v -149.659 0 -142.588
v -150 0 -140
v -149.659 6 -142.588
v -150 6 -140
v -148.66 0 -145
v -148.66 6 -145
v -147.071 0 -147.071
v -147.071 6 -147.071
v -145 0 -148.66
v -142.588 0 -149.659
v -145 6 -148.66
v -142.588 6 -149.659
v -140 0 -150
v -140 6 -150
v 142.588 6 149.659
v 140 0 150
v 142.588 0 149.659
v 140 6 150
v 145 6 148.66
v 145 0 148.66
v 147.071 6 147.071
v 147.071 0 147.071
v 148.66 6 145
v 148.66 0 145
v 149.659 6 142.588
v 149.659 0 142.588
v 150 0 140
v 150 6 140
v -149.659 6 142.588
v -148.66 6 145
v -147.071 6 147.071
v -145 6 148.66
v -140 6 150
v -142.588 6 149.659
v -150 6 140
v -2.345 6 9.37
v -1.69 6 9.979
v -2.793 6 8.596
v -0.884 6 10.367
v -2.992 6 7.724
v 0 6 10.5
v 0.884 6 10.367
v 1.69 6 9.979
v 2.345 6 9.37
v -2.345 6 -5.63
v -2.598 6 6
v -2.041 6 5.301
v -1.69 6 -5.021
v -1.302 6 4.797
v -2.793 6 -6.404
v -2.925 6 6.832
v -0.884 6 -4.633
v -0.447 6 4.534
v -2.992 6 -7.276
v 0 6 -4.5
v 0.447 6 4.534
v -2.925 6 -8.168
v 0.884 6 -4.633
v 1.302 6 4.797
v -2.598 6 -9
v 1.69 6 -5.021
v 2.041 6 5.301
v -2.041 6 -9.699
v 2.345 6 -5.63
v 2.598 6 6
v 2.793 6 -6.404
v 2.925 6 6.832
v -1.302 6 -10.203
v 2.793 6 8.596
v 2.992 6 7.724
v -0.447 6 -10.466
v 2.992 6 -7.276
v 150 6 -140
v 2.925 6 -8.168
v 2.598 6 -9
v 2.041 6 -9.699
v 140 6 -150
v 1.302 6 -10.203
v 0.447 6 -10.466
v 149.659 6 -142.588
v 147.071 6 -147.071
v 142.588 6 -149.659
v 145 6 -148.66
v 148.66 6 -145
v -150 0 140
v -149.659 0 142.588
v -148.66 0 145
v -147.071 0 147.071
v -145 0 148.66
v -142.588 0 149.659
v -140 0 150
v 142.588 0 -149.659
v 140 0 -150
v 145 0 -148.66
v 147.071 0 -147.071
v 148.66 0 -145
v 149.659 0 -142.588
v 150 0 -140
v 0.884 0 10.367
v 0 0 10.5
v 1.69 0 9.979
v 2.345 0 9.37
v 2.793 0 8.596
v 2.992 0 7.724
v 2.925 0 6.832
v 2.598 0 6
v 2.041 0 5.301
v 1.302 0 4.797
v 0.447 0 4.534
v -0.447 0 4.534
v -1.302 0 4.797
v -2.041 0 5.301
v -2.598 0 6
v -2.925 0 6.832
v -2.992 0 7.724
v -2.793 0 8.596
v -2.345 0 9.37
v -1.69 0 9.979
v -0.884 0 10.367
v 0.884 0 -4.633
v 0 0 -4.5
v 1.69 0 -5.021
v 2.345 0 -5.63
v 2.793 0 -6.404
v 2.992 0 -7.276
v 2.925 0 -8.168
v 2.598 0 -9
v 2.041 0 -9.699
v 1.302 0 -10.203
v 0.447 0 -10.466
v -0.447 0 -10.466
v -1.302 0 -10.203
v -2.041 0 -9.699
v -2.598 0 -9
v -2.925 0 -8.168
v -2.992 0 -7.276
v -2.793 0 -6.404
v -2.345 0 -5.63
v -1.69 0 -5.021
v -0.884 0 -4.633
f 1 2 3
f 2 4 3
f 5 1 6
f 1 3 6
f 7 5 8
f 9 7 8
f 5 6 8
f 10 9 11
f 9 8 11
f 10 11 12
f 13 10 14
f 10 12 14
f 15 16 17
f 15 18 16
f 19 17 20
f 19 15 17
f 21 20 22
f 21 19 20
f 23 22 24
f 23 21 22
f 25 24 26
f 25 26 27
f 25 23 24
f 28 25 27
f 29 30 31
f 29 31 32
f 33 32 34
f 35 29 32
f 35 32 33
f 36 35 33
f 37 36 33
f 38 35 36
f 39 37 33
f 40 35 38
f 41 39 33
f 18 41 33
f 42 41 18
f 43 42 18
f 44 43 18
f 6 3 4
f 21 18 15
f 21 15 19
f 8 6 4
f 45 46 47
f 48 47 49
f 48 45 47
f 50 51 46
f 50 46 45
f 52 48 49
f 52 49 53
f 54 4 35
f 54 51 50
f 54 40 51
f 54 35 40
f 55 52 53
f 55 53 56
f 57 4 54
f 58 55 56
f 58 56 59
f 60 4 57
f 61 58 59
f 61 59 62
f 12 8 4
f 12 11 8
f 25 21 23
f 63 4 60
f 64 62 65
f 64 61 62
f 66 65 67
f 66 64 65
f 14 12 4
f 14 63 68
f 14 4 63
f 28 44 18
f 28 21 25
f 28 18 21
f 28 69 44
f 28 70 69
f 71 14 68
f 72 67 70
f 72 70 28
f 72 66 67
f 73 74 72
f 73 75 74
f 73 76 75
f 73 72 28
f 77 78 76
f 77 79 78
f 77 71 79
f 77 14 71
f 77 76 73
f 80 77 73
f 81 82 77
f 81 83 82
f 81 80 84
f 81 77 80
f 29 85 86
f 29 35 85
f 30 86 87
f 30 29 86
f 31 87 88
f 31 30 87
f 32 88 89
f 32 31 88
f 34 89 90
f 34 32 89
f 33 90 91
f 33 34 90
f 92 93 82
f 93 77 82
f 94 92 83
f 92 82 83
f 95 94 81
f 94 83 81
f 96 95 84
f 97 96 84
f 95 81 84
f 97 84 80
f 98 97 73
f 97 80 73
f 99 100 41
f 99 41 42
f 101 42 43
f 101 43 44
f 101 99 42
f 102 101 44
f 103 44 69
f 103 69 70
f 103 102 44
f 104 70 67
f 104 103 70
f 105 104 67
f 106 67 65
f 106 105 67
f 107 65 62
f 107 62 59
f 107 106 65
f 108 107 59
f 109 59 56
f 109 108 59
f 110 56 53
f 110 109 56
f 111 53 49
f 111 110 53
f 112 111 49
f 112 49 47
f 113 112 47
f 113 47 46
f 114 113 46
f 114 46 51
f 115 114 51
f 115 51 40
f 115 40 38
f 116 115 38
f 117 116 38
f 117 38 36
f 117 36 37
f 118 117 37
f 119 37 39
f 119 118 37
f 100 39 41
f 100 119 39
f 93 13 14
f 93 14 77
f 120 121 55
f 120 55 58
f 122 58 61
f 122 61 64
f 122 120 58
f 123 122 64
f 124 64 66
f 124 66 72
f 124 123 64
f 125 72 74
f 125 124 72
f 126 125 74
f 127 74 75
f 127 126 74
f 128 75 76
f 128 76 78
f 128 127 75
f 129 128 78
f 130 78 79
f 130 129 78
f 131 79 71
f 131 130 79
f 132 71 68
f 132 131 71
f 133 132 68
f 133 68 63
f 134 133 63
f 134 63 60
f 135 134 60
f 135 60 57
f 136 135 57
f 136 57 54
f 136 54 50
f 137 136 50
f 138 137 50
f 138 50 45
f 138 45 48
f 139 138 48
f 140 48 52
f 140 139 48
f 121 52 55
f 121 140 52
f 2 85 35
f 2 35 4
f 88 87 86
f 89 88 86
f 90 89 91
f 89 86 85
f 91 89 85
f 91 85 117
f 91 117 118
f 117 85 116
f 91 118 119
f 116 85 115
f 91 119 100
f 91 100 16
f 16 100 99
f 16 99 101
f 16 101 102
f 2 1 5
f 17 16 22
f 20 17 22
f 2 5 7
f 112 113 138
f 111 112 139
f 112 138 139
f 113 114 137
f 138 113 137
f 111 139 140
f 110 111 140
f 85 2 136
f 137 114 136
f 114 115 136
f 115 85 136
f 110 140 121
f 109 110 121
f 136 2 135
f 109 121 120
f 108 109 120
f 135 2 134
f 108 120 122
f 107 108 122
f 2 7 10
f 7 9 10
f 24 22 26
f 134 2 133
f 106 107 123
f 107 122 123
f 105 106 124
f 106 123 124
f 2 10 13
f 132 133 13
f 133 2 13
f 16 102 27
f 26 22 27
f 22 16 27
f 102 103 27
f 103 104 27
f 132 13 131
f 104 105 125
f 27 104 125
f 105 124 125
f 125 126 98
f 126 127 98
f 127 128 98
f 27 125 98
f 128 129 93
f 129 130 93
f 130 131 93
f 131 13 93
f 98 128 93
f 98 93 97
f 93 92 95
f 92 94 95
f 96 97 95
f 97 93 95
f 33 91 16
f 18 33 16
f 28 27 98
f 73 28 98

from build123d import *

# Parameters (mm, degrees)
WEIGHINGPLATEFORM_W = 300
WEIGHINGPLATEFORM_H = 300
WEIGHINGPLATEFORM_R = 3
BOSS_EXTRUDE1_DEPTH = 6
FILLET1_R           = 10


with BuildPart() as part:
    # WeighingPlateform → Boss-Extrude1 (new body)
    with BuildSketch(Plane(origin=(0, 0, 0), x_dir=(1, 0, 0), z_dir=(0, 1, 0))):
        Rectangle(WEIGHINGPLATEFORM_W, WEIGHINGPLATEFORM_H)
        with Locations(Location((0, 7.5, 0), (0, 0, 270))):
            Circle(WEIGHINGPLATEFORM_R, mode=Mode.SUBTRACT)
        with Locations(Location((0, -7.5, 0), (0, 0, 270))):
            Circle(WEIGHINGPLATEFORM_R, mode=Mode.SUBTRACT)
    extrude(amount=BOSS_EXTRUDE1_DEPTH)

    # Fillet1
    fillet1_edges = [part.edges().sort_by_distance(p)[0] for p in [
        (-150, 3, -150),
        (150, 3, -150),
        (150, 3, 150),
        (-150, 3, 150),
    ]]
    fillet(fillet1_edges, radius=FILLET1_R)


solid = part.part
